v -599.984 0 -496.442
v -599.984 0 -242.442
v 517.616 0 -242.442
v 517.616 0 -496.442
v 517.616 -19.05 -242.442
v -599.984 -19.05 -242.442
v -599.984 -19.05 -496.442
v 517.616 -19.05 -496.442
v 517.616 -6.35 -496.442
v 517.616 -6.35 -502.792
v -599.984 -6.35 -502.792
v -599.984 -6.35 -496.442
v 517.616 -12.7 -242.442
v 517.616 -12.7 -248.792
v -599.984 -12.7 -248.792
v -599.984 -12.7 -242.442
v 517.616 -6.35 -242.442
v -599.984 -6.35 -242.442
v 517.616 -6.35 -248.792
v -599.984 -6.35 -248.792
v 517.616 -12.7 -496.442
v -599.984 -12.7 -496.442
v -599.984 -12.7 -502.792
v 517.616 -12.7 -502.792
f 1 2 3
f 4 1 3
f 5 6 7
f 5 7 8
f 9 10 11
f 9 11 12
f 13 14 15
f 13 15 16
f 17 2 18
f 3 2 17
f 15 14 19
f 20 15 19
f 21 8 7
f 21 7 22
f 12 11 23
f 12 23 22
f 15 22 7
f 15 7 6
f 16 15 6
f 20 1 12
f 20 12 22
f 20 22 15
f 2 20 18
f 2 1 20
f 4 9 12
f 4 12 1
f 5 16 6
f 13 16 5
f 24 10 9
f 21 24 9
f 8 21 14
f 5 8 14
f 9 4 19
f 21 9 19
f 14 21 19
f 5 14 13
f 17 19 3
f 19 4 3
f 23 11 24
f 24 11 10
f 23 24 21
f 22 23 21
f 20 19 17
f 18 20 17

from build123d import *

# Parameters (mm, degrees)
F0_W     = 1117.6
F0_H     = 260.35
F1_DEPTH = 19.05
F2_W     = 6.35
F2_H     = 6.35
F3_DEPTH = 1117.601
F4_W     = 6.35
F4_H     = 6.35
F5_DEPTH = 1117.601


with BuildPart() as f1:
    # F0 (on Front) → F1 (new body)
    with BuildSketch(Plane.XZ):
        with Locations((-41.18352, -372.617407)):
            Rectangle(F0_W, F0_H)
    extrude(amount=F1_DEPTH)

    # F2 (on face) → F3 (cut, through all)
    with BuildSketch(Plane.YZ.offset(517.61648)):
        with Locations((-9.525, -245.617407)):
            Rectangle(F2_W, F2_H)
    extrude(amount=-F3_DEPTH, mode=Mode.SUBTRACT)

    # F4 (on face) + F2 (on face) → F5 (cut, through all)
    with BuildSketch(Plane.YZ.offset(517.61648)):
        with Locations((-15.875, -499.617407)):
            Rectangle(F4_W, F4_H)
        with Locations((-3.175, -499.617407)):
            Rectangle(F4_W, F4_H)
    with BuildSketch(Plane.YZ.offset(517.61648)):
        with Locations((-9.525, -245.617407)):
            Rectangle(F2_W, F2_H)
    extrude(amount=-F5_DEPTH, mode=Mode.SUBTRACT)


solid = f1.part
